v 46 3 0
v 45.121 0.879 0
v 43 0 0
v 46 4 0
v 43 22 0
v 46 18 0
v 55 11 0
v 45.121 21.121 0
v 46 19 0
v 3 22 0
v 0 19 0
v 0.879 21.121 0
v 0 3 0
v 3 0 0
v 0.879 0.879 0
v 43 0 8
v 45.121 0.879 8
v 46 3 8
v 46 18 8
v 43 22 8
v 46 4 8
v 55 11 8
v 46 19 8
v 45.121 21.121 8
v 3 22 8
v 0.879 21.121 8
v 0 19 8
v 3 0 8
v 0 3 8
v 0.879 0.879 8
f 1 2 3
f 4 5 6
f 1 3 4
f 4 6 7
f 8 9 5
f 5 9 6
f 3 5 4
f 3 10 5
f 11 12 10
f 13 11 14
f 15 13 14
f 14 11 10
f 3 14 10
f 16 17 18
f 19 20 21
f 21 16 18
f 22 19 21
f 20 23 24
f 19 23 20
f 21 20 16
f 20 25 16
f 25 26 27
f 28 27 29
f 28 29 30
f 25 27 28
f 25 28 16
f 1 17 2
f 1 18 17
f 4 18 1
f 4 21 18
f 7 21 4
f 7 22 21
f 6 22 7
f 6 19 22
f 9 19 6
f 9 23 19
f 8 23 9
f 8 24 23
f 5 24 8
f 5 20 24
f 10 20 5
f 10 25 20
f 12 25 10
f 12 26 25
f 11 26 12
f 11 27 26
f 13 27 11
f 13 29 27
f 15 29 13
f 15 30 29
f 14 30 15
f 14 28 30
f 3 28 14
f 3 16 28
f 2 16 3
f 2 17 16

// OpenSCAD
$fn = 32;

// ----------------------------------------------------------------------
// Ratchet pawl: 46 x 22 mm body, beak 9 mm с правого торца
// ----------------------------------------------------------------------

// --- parameters (mm) ---
profile_height = 8;       // extrusion height
profile_points = 15;      // points of the closed outline

profile = [[0, 3], [0.879, 0.879], [3, 0], [43, 0], [45.121, 0.879], [46, 3], [46, 4], [55, 11], [46, 18], [46, 19], [45.121, 21.121], [43, 22], [3, 22], [0.879, 21.121], [0, 19]];  // single closed polygon, 15 points, counter clockwise

// --- the one profile operation ---
linear_extrude(height = profile_height) polygon(points = profile);
